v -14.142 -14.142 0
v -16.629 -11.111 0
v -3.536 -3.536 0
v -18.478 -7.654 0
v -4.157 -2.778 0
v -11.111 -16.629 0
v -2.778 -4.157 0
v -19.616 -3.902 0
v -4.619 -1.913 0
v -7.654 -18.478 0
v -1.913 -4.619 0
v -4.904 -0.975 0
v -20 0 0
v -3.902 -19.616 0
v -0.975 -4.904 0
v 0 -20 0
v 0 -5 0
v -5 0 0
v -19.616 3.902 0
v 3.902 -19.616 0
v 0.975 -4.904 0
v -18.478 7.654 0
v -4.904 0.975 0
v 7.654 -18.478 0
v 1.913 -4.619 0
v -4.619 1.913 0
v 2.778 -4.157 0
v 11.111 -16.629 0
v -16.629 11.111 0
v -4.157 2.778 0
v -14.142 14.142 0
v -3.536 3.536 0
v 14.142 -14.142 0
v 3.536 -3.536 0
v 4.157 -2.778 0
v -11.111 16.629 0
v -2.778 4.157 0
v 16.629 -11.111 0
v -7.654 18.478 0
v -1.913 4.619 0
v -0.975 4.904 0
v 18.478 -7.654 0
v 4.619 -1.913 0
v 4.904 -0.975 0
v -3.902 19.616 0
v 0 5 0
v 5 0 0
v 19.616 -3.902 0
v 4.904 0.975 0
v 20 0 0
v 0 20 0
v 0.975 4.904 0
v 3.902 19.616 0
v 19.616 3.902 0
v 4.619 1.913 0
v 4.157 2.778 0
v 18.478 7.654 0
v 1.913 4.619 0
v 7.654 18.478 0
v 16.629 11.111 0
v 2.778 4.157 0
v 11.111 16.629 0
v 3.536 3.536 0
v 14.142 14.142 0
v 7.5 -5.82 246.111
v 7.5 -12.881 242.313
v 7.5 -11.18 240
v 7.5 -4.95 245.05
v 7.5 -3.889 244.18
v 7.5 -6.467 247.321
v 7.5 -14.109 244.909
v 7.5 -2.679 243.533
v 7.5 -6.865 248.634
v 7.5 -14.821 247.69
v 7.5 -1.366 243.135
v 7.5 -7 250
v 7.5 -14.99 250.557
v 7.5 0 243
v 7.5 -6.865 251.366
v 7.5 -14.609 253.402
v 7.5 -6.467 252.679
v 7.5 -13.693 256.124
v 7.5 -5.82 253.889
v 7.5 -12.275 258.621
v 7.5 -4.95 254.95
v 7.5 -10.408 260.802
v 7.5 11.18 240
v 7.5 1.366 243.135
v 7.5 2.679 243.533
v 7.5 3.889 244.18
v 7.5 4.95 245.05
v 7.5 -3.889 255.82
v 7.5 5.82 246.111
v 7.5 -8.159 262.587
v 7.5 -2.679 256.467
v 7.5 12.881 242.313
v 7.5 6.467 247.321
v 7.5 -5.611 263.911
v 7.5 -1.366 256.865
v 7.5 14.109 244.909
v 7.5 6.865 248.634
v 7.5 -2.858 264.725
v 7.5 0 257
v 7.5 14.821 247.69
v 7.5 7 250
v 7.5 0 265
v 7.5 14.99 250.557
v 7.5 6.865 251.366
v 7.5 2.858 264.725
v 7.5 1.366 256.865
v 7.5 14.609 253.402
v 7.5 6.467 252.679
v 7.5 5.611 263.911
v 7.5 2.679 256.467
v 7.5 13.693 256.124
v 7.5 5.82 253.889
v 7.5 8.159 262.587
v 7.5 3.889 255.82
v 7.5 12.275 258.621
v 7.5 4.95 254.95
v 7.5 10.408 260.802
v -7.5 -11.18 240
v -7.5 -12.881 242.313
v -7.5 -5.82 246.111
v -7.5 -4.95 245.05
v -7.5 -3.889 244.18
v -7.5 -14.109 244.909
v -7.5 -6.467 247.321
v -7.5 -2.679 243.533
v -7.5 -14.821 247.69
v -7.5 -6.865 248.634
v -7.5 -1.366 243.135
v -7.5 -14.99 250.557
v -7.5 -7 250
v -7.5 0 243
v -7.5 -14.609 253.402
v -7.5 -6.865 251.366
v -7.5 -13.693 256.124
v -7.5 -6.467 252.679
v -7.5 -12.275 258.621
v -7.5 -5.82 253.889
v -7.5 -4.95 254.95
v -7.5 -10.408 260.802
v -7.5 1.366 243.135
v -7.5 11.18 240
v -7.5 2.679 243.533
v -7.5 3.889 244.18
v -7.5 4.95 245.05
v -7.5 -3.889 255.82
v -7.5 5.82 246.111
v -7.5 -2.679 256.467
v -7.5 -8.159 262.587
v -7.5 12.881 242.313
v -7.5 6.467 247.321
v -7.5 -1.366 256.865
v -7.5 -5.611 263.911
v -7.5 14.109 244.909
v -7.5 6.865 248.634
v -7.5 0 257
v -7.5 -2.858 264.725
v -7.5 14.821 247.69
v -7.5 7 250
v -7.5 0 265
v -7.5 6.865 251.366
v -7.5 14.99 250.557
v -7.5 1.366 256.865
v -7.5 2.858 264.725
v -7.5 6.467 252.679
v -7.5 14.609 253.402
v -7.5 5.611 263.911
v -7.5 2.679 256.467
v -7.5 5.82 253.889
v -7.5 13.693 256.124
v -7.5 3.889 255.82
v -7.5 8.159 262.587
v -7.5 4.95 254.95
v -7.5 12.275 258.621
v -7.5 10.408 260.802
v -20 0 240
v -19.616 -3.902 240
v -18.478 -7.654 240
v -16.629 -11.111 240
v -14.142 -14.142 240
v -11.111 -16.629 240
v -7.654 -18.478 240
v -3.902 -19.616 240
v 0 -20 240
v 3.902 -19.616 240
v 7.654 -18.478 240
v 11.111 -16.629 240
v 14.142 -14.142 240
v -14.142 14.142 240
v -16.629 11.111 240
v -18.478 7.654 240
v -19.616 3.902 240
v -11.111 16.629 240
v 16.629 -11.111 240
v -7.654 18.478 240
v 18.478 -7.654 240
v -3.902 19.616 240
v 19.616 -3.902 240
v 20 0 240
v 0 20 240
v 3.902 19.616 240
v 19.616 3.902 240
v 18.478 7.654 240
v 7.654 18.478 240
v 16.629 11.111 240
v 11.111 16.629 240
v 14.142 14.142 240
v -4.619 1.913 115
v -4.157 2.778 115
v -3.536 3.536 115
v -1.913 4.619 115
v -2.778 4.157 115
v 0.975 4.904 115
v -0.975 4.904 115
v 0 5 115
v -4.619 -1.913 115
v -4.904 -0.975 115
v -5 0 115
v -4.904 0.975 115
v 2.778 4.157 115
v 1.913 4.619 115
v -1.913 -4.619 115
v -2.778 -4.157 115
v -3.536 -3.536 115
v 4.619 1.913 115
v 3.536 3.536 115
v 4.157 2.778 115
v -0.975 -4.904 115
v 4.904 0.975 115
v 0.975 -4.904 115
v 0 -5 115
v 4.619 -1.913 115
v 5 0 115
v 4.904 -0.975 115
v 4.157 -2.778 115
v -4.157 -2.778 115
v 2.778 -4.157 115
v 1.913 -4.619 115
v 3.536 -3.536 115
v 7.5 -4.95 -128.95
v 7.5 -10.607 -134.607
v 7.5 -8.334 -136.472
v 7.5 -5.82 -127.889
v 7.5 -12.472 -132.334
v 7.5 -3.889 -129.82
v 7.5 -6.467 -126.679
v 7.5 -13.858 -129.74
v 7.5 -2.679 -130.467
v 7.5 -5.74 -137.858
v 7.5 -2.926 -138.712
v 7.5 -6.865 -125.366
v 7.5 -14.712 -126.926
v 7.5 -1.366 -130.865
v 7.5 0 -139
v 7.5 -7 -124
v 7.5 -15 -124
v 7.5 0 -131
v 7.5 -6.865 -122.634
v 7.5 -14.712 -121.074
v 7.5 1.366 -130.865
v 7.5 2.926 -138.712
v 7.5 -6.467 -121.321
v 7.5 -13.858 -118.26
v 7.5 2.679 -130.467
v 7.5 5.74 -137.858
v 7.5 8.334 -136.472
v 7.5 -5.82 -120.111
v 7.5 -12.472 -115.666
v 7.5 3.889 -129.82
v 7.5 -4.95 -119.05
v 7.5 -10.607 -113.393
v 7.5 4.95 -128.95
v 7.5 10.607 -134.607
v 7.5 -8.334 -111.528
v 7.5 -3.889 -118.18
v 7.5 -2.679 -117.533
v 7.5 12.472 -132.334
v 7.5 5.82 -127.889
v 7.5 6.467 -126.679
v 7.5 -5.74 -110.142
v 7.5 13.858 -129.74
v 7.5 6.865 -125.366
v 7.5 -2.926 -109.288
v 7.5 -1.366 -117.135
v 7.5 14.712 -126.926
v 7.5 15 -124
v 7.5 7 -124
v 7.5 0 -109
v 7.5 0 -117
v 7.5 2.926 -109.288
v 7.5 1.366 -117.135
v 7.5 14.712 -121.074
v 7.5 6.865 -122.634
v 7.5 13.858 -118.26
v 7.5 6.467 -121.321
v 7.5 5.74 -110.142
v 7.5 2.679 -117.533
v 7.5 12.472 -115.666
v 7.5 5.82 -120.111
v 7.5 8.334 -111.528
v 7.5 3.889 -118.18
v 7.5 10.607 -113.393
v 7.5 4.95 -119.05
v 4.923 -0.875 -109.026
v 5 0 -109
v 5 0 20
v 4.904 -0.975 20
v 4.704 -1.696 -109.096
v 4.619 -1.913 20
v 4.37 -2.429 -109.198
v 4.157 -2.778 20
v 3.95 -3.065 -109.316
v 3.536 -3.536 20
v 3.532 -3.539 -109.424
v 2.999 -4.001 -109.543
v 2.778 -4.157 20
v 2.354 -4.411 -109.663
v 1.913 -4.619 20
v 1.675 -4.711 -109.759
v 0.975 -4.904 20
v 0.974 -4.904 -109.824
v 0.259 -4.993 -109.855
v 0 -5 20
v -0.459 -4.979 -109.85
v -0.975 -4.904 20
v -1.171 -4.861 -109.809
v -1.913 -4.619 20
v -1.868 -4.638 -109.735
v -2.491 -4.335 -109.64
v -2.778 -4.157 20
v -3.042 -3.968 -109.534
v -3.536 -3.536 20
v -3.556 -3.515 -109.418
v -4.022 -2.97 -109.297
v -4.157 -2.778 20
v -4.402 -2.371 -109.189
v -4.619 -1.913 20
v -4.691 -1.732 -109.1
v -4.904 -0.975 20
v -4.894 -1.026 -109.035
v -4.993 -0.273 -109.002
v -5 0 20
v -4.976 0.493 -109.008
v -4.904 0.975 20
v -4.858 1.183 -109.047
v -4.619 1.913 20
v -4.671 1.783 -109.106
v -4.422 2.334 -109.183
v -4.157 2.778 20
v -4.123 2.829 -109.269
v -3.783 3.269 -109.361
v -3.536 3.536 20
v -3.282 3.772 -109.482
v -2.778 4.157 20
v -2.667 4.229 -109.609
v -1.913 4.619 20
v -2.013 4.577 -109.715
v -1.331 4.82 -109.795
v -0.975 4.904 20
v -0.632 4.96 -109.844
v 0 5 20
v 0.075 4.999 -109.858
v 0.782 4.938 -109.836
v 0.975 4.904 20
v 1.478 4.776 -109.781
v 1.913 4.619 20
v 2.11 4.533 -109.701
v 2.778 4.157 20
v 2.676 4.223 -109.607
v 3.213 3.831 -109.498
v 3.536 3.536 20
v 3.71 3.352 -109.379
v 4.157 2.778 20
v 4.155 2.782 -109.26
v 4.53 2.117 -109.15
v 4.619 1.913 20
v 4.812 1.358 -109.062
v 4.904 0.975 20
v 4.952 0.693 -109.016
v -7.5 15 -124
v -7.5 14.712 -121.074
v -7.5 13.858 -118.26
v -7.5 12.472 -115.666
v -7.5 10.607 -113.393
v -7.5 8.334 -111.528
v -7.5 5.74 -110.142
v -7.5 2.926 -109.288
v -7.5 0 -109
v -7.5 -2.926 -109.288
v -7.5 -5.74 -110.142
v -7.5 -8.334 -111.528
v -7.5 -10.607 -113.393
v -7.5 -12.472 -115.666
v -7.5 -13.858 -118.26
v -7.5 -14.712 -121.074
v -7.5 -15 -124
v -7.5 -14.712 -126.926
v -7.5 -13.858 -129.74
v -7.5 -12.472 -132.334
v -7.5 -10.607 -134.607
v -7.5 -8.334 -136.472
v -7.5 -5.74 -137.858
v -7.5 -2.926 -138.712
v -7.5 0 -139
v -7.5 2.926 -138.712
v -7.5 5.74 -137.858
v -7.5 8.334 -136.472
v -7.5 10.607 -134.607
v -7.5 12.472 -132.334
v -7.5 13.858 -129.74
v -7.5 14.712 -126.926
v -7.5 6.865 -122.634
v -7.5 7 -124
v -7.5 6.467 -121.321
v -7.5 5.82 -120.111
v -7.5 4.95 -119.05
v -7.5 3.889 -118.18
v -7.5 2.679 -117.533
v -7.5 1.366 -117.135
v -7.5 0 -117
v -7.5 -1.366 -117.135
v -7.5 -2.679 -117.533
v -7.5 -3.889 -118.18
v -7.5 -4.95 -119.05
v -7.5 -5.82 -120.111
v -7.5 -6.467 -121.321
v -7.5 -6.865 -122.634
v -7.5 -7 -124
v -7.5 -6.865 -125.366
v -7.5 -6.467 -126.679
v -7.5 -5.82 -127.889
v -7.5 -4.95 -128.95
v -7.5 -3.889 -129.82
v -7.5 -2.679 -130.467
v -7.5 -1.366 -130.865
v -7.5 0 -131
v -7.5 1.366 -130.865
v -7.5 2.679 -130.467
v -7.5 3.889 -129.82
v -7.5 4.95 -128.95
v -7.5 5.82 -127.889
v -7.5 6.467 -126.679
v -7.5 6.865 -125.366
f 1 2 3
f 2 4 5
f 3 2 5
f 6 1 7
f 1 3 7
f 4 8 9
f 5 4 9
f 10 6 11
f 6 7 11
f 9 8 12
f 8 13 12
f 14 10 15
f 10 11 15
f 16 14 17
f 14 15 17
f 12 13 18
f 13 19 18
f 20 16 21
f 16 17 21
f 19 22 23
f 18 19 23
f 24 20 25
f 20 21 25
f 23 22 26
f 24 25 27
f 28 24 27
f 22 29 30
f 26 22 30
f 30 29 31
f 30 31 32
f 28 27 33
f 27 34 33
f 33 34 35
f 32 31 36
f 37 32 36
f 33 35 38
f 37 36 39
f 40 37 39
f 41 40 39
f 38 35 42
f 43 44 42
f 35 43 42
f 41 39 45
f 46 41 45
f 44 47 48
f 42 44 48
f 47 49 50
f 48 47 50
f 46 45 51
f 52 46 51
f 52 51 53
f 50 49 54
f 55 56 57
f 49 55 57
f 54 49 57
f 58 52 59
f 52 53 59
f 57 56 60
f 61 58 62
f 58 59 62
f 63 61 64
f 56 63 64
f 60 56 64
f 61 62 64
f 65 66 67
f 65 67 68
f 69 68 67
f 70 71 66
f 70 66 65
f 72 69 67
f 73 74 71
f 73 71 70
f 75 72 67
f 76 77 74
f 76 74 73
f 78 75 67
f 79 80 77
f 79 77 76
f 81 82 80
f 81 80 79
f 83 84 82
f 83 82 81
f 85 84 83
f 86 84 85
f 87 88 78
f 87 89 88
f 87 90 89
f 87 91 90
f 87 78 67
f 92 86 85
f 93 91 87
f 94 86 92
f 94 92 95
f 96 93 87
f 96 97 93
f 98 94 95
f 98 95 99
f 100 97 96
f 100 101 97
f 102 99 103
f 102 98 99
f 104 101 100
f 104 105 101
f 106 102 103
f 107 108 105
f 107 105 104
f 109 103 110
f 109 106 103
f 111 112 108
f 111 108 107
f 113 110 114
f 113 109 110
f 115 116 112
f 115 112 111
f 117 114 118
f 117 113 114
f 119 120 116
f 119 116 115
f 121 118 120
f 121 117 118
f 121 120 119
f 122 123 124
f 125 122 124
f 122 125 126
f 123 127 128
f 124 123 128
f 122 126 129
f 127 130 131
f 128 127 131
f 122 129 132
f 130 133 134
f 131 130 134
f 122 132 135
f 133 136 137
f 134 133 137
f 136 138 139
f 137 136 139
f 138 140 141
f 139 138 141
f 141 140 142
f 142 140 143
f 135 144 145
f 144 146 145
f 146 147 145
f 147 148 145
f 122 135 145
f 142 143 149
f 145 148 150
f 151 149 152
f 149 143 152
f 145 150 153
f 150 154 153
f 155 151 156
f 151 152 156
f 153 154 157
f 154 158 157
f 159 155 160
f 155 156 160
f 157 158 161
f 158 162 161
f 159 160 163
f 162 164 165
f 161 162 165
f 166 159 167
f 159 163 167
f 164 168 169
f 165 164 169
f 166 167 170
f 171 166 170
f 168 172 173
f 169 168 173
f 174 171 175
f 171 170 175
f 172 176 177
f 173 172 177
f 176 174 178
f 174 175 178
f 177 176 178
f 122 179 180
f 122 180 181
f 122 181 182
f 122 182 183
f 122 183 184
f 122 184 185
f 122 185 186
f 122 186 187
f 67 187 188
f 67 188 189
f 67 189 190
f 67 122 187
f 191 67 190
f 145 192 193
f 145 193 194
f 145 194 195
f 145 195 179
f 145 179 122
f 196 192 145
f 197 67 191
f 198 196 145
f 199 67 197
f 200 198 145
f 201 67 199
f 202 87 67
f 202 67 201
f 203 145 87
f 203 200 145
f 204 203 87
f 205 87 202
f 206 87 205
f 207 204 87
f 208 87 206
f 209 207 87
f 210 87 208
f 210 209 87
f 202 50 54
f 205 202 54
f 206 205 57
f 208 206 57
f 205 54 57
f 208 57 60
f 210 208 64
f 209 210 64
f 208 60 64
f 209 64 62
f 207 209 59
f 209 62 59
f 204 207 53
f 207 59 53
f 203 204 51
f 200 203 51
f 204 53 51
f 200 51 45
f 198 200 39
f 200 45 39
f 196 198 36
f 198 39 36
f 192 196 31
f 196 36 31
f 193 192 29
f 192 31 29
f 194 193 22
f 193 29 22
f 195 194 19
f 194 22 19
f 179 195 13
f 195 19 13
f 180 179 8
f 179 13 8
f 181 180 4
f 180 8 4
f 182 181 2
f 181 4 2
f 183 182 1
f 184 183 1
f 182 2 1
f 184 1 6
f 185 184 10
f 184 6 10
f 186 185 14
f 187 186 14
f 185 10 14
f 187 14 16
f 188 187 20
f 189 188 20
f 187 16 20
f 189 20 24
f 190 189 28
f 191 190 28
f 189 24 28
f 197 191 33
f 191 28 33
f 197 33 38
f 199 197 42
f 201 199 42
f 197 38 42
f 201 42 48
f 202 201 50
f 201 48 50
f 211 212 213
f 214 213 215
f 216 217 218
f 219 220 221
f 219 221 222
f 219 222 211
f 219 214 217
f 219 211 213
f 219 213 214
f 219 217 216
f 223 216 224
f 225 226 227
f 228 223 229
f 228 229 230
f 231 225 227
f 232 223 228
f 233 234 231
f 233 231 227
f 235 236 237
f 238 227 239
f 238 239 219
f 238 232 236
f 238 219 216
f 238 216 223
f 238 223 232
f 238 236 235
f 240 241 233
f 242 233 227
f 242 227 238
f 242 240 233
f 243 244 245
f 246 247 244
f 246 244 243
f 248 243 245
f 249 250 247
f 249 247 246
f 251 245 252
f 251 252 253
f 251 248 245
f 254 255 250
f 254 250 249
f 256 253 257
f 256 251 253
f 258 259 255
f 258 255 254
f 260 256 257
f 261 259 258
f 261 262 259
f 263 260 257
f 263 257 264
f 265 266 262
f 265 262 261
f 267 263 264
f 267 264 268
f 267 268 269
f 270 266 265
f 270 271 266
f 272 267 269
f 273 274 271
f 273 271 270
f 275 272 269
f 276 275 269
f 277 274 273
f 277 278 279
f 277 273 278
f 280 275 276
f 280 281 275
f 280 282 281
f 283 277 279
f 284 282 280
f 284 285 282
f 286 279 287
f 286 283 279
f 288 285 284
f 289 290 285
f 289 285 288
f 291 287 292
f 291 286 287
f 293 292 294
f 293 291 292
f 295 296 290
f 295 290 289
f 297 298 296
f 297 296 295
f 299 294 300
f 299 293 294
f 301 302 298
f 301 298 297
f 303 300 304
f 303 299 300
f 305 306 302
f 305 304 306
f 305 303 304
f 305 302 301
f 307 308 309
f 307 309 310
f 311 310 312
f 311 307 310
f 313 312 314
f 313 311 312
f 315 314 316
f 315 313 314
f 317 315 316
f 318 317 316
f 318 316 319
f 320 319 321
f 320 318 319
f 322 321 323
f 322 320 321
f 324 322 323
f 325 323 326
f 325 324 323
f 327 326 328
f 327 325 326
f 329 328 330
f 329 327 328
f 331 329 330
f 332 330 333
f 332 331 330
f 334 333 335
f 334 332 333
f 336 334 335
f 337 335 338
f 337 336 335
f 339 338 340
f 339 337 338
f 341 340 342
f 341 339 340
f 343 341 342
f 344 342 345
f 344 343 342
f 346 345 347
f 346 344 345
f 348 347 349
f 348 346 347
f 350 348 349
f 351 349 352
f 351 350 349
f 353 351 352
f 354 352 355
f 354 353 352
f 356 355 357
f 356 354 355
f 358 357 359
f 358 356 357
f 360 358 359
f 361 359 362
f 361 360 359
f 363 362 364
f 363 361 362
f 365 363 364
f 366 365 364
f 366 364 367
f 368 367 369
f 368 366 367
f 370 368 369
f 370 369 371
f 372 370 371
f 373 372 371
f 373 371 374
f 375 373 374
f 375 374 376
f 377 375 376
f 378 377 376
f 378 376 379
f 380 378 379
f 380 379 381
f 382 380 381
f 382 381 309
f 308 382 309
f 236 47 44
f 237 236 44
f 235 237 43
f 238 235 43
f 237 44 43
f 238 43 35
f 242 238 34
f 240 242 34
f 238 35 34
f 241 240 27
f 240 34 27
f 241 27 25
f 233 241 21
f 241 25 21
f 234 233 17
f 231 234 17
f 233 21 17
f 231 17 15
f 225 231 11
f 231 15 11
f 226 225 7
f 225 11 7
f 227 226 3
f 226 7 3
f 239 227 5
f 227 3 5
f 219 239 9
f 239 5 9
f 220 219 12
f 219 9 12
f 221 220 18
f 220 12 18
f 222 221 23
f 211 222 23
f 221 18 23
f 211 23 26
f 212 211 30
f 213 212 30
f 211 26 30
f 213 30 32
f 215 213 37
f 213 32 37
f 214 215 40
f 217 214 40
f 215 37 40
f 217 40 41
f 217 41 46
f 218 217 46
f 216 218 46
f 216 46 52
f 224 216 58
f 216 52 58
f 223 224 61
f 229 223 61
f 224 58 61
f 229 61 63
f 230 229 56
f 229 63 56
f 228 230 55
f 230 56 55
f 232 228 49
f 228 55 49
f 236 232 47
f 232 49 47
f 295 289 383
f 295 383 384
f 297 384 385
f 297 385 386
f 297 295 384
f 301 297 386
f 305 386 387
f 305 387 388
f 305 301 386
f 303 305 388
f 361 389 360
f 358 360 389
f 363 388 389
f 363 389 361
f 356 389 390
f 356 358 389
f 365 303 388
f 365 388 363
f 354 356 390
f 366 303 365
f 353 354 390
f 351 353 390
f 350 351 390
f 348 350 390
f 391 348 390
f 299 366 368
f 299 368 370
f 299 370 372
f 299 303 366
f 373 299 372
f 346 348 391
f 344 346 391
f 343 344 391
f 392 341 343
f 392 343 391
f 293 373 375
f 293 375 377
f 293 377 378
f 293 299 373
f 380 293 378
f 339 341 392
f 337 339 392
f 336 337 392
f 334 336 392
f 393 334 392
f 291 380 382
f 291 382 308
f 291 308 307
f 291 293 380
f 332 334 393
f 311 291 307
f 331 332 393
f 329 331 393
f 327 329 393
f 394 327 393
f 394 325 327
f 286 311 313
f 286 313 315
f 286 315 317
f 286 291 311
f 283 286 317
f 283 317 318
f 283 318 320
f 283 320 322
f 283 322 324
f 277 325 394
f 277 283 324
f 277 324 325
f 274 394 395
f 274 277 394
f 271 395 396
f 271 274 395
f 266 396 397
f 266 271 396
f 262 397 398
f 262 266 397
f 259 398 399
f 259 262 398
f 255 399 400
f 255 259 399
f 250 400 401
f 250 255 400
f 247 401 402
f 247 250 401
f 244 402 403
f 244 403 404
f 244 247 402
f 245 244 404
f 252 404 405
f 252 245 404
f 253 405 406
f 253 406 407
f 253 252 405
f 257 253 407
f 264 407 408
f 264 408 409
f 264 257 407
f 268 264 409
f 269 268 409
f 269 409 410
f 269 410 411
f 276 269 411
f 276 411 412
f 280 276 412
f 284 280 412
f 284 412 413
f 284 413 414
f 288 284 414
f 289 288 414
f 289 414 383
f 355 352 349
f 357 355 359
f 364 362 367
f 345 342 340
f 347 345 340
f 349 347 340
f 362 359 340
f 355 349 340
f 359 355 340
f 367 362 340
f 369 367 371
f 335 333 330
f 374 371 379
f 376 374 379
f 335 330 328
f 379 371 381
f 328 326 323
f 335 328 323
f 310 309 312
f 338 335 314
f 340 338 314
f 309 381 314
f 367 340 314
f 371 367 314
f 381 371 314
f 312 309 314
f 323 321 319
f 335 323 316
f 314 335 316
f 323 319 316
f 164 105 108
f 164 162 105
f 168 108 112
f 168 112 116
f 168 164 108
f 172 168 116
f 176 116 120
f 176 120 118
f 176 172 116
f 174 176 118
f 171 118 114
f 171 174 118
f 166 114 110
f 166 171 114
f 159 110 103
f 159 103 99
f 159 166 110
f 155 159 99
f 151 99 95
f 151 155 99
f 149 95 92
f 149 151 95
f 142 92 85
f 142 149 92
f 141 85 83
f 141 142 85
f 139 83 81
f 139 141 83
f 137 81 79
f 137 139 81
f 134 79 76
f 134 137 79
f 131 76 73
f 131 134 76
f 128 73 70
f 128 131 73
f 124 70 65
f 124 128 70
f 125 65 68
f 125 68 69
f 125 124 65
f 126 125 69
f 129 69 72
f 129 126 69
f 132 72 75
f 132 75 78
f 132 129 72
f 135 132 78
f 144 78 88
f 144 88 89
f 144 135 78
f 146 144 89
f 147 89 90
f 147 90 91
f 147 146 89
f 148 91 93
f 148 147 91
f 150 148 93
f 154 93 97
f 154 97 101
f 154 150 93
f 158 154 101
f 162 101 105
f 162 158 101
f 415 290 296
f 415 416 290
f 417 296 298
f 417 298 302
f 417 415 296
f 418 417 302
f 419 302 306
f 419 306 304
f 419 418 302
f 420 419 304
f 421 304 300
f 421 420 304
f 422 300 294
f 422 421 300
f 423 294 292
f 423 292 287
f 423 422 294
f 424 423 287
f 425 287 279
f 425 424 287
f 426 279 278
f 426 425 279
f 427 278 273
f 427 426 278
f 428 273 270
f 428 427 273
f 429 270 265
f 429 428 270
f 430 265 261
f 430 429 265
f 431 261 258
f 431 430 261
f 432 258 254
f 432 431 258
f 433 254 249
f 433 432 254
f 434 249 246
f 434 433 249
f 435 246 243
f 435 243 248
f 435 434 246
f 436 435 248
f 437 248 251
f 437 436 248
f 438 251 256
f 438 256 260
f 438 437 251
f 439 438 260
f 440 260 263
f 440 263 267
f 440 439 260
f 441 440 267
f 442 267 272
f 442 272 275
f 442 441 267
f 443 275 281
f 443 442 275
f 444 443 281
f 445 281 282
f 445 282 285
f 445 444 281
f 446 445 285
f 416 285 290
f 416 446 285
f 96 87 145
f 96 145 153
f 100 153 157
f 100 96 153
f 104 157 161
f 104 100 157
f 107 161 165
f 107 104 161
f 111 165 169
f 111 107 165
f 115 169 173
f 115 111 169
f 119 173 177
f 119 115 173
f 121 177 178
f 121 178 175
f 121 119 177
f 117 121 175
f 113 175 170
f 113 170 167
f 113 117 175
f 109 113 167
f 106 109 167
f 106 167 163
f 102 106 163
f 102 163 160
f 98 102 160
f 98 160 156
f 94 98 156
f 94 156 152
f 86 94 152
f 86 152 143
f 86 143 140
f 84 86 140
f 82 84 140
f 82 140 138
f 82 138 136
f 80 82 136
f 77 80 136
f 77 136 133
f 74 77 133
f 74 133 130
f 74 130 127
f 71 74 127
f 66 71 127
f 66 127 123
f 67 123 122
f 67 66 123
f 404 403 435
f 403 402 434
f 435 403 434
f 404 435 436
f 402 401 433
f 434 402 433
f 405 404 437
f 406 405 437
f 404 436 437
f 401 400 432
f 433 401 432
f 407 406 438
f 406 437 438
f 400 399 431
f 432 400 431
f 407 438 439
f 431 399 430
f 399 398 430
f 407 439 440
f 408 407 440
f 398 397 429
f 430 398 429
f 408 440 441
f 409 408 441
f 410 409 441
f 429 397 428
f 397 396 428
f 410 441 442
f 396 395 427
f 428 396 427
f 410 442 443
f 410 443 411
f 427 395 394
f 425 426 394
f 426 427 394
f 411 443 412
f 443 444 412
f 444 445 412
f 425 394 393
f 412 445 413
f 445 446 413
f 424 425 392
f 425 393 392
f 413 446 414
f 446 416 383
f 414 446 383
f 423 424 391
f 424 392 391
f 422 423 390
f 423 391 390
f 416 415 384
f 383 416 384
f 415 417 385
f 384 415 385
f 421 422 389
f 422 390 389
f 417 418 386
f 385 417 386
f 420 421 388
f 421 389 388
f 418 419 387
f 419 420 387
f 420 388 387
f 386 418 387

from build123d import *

# Parameters (mm, degrees)
F0_R          = 20
F1_DEPTH      = 240
F2_R          = 15
F2_R_2        = 7
F3_DEPTH      = 7.5
F4_R          = 5
F5_DEPTH      = 115
F6_DEPTH      = 114
F6_DEPTH_BACK = 20
F7_R          = 15
F7_R_2        = 7
F8_DEPTH      = 7.5


with BuildPart() as f1:
    # F0 (on Top) → F1 (new body)
    with BuildSketch(Plane.XY):
        Circle(F0_R)
    extrude(amount=F1_DEPTH)

    # F2 (on Right) → F3 (join, symmetric)
    with BuildSketch(Plane.YZ):
        with Locations((0, 250)):
            Circle(F2_R)
        with Locations((0, 250)):
            Circle(F2_R_2, mode=Mode.SUBTRACT)
    extrude(amount=F3_DEPTH, both=True)

    # F4 (on face) → F5 (cut)
    with BuildSketch(Plane(origin=(0, 0, 0), x_dir=(1, 0, 0), z_dir=(0, 0, -1))):
        Circle(F4_R)
    extrude(amount=-F5_DEPTH, mode=Mode.SUBTRACT)


with BuildPart() as f6:
    # F4 (on face) → F6 (new body, two sides)
    with BuildSketch(Plane(origin=(0, 0, 0), x_dir=(1, 0, 0), z_dir=(0, 0, -1))) as f6_sk:
        Circle(F4_R)
    extrude(amount=F6_DEPTH)
    extrude(f6_sk.sketch, amount=-F6_DEPTH_BACK)

    # F7 (on Right) → F8 (join, symmetric)
    with BuildSketch(Plane.YZ):
        with Locations((0, -124)):
            Circle(F7_R)
        with Locations((0, -124)):
            Circle(F7_R_2, mode=Mode.SUBTRACT)
    extrude(amount=F8_DEPTH, both=True)


solid = Compound([f1.part, f6.part])
